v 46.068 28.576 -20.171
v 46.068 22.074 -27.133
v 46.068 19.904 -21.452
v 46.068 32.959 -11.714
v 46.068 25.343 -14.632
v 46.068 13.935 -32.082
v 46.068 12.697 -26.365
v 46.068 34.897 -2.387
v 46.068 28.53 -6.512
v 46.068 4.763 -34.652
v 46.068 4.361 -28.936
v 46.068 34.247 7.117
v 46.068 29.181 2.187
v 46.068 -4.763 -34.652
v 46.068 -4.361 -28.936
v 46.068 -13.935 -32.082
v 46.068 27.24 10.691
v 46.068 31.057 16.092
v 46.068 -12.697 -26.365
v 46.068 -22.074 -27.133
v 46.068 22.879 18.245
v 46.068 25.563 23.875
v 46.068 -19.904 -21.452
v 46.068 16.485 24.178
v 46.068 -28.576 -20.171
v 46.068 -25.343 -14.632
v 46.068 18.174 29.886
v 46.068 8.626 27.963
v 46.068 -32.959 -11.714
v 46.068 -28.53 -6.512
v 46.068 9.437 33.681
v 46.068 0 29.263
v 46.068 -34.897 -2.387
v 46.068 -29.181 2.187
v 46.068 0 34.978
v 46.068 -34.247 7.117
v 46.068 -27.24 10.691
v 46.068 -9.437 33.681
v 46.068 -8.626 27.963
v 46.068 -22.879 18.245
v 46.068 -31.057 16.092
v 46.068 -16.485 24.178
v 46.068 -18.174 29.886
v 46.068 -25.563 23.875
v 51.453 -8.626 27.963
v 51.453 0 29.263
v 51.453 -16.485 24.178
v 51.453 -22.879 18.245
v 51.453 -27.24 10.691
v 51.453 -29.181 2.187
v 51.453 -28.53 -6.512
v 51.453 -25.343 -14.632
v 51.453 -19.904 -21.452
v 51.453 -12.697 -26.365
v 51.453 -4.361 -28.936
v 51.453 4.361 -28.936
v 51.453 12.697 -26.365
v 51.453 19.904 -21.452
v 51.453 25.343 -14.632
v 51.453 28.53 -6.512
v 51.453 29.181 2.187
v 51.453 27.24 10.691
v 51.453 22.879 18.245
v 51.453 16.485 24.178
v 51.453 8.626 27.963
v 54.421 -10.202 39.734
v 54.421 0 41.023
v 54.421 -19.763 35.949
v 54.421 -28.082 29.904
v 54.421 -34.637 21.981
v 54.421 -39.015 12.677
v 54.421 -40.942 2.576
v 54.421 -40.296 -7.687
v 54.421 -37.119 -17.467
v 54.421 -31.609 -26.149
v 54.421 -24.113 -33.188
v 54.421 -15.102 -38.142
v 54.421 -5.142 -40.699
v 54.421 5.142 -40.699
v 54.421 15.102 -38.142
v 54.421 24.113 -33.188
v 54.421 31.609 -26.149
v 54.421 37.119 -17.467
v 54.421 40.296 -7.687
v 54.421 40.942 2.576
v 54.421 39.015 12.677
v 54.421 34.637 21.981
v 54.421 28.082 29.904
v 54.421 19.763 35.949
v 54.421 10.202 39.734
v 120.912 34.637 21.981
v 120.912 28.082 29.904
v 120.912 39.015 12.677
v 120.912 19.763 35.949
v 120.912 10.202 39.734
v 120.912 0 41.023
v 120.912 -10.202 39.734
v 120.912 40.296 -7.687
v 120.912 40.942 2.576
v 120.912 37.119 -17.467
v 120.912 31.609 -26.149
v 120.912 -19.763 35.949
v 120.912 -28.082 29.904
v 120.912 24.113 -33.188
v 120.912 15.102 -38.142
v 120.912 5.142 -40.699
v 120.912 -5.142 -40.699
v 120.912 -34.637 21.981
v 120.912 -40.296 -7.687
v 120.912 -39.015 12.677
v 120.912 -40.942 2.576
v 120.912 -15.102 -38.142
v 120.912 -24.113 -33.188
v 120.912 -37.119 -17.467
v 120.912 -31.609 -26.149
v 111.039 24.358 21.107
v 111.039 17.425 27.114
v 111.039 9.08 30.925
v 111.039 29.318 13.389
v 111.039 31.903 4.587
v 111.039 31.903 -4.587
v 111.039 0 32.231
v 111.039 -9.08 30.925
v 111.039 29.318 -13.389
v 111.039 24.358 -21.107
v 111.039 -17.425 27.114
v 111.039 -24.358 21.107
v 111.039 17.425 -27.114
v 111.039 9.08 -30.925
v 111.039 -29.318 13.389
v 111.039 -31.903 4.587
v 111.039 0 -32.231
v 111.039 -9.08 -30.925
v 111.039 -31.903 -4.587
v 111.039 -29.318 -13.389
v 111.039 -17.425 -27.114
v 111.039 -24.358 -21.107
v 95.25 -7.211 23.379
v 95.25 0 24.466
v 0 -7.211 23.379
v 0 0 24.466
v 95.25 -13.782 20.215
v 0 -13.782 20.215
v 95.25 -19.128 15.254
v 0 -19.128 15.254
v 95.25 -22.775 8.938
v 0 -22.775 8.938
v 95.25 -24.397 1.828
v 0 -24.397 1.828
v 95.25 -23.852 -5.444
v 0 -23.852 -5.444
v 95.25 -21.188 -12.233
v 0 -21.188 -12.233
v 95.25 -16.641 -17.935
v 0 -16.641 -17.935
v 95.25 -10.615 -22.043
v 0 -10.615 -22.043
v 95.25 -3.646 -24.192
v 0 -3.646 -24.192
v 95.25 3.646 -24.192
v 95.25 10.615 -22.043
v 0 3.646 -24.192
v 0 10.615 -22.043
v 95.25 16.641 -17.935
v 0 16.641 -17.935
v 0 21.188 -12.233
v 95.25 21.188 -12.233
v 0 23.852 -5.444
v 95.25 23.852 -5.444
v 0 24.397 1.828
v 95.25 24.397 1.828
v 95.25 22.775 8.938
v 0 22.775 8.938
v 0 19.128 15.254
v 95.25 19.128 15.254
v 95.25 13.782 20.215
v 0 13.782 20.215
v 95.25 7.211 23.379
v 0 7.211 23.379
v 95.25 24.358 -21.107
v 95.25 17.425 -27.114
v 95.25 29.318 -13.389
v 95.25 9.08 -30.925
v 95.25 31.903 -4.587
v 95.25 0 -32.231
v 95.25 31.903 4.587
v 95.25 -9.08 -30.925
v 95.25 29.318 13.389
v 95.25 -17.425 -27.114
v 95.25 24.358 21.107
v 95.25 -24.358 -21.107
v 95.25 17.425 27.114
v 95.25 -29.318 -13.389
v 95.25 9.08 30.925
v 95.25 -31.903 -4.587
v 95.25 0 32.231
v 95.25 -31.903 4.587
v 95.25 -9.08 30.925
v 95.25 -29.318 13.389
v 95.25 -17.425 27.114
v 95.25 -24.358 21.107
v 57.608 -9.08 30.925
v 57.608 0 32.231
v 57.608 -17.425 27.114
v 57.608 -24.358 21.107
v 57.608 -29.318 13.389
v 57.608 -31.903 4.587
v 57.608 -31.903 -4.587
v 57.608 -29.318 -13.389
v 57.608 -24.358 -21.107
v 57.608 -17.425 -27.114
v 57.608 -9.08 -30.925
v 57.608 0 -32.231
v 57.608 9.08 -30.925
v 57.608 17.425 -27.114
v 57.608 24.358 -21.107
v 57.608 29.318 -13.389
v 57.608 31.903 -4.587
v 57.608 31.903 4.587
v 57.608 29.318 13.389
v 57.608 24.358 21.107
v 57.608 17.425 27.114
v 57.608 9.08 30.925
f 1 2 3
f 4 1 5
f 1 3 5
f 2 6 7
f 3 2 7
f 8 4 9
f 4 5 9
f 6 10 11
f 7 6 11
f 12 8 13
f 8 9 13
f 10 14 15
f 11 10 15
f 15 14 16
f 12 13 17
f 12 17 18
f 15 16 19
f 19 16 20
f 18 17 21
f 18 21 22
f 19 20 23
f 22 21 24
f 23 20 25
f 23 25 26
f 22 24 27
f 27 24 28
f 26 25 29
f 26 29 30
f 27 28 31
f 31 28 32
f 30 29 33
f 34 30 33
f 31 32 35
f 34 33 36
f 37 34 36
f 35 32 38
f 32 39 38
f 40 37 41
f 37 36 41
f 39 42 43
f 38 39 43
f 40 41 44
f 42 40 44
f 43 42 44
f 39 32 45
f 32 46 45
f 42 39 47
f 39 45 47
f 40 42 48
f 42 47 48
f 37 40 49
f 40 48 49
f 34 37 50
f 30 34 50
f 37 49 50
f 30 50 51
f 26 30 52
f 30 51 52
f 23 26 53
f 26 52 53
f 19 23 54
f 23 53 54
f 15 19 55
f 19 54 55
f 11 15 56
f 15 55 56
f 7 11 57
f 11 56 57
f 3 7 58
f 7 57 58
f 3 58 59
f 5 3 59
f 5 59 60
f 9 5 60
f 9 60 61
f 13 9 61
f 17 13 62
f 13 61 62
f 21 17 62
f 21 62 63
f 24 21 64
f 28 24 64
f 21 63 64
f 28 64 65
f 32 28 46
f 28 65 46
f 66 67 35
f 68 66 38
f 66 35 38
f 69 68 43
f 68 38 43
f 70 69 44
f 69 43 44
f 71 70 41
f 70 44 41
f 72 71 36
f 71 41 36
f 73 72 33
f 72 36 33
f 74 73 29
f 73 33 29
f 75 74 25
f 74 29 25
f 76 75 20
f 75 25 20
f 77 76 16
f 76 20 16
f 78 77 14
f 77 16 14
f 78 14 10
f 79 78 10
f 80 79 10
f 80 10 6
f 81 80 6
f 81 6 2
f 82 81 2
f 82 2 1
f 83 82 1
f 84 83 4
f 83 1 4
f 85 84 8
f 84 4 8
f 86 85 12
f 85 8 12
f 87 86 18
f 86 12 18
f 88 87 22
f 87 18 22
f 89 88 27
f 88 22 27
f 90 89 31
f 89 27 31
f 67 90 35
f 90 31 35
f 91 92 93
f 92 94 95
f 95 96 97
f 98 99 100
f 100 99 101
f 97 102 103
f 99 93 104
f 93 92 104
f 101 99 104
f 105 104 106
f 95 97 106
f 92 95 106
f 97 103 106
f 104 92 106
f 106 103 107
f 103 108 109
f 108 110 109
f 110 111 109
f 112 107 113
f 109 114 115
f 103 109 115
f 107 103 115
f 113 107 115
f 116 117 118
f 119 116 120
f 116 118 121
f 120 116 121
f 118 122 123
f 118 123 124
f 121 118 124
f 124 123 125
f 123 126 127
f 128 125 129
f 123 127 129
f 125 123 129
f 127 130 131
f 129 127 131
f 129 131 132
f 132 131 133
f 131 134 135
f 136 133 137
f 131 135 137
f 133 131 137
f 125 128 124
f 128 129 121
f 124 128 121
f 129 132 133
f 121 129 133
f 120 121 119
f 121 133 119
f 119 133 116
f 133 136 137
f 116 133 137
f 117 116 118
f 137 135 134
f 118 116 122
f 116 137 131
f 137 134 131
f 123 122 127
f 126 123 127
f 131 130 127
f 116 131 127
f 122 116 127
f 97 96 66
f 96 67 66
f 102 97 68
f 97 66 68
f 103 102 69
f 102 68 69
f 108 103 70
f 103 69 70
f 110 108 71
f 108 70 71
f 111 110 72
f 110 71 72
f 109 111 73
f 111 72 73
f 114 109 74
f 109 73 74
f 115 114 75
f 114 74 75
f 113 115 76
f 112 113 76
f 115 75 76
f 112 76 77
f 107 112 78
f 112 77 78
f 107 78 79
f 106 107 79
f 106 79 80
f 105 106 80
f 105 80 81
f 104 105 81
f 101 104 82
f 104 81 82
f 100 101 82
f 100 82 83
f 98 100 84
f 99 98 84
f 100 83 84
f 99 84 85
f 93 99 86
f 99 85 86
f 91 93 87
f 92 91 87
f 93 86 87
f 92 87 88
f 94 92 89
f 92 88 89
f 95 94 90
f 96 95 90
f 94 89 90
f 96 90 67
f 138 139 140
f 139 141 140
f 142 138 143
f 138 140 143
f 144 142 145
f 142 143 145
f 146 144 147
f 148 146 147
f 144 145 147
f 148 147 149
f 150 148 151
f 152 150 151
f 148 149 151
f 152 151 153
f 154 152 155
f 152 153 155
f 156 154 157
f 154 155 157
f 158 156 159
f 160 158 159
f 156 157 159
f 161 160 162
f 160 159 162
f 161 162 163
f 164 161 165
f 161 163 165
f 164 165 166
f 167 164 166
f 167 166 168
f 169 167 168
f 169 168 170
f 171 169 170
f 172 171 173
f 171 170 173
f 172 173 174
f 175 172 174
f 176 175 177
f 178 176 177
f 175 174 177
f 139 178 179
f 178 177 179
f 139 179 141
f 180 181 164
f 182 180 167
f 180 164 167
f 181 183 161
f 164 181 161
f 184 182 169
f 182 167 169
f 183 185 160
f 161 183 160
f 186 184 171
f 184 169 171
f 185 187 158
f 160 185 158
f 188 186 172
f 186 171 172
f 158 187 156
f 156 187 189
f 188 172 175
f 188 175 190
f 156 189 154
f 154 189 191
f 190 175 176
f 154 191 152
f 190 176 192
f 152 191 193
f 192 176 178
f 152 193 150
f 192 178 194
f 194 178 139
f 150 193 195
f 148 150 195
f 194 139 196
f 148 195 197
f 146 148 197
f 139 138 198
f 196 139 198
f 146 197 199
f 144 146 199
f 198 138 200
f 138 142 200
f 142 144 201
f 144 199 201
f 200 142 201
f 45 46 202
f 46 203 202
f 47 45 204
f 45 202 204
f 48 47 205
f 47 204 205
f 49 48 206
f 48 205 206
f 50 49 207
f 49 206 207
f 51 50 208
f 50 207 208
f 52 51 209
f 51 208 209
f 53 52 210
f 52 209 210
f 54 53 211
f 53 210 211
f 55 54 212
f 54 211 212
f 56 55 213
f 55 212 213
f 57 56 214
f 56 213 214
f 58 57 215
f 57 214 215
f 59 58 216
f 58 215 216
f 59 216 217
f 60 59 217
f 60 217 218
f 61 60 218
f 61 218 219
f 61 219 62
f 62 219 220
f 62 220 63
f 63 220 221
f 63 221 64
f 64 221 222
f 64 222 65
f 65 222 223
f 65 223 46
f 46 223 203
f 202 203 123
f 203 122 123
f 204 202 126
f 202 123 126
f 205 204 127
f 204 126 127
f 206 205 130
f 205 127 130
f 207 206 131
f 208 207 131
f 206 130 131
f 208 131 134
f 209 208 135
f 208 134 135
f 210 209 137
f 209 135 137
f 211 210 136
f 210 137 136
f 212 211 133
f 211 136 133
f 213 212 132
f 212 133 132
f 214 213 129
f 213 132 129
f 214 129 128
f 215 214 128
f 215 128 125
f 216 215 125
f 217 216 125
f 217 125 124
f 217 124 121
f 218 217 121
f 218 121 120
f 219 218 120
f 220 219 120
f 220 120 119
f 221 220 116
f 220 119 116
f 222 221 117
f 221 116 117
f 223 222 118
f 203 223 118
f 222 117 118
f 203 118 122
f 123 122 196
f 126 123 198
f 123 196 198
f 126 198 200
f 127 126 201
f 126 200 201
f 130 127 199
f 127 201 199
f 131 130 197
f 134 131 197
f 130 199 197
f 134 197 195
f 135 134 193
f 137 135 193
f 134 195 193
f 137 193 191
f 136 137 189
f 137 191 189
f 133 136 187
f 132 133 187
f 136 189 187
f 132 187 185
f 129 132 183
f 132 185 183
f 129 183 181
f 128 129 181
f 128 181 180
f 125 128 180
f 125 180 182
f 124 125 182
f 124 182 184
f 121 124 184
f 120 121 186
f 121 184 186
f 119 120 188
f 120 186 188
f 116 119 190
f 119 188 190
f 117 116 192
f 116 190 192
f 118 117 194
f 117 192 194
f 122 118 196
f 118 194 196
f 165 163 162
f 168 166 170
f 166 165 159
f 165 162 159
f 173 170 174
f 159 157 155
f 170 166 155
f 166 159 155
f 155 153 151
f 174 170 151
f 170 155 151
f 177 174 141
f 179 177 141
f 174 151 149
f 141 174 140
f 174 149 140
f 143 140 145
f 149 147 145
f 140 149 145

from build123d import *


with BuildPart() as f1:
    # F0 (on Front) → F1 (revolve)
    with BuildSketch(Plane.XZ):
        Polygon((0, 24.465741), (0, 0), (111.038732, 0), (111.038732, 32.230687), (95.25, 32.230687), (95.25, 24.465741), align=None)
    revolve(axis=Axis((0, 0, 0), (1, 0, 0)))


with BuildPart() as f3:
    # F2 (on Front) → F3 (revolve)
    with BuildSketch(Plane.XZ):
        Polygon((111.038732, 32.230687), (111.038732, 0), (120.911948, 0), (120.911948, 41.022934), (54.420561, 41.022934), (46.067923, 34.978263), (46.067923, 29.263303), (51.453177, 29.263303), (57.607751, 32.230687), align=None)
    revolve(axis=Axis((0, 0, 0), (1, 0, 0)))


solid = Compound([f1.part, f3.part])
